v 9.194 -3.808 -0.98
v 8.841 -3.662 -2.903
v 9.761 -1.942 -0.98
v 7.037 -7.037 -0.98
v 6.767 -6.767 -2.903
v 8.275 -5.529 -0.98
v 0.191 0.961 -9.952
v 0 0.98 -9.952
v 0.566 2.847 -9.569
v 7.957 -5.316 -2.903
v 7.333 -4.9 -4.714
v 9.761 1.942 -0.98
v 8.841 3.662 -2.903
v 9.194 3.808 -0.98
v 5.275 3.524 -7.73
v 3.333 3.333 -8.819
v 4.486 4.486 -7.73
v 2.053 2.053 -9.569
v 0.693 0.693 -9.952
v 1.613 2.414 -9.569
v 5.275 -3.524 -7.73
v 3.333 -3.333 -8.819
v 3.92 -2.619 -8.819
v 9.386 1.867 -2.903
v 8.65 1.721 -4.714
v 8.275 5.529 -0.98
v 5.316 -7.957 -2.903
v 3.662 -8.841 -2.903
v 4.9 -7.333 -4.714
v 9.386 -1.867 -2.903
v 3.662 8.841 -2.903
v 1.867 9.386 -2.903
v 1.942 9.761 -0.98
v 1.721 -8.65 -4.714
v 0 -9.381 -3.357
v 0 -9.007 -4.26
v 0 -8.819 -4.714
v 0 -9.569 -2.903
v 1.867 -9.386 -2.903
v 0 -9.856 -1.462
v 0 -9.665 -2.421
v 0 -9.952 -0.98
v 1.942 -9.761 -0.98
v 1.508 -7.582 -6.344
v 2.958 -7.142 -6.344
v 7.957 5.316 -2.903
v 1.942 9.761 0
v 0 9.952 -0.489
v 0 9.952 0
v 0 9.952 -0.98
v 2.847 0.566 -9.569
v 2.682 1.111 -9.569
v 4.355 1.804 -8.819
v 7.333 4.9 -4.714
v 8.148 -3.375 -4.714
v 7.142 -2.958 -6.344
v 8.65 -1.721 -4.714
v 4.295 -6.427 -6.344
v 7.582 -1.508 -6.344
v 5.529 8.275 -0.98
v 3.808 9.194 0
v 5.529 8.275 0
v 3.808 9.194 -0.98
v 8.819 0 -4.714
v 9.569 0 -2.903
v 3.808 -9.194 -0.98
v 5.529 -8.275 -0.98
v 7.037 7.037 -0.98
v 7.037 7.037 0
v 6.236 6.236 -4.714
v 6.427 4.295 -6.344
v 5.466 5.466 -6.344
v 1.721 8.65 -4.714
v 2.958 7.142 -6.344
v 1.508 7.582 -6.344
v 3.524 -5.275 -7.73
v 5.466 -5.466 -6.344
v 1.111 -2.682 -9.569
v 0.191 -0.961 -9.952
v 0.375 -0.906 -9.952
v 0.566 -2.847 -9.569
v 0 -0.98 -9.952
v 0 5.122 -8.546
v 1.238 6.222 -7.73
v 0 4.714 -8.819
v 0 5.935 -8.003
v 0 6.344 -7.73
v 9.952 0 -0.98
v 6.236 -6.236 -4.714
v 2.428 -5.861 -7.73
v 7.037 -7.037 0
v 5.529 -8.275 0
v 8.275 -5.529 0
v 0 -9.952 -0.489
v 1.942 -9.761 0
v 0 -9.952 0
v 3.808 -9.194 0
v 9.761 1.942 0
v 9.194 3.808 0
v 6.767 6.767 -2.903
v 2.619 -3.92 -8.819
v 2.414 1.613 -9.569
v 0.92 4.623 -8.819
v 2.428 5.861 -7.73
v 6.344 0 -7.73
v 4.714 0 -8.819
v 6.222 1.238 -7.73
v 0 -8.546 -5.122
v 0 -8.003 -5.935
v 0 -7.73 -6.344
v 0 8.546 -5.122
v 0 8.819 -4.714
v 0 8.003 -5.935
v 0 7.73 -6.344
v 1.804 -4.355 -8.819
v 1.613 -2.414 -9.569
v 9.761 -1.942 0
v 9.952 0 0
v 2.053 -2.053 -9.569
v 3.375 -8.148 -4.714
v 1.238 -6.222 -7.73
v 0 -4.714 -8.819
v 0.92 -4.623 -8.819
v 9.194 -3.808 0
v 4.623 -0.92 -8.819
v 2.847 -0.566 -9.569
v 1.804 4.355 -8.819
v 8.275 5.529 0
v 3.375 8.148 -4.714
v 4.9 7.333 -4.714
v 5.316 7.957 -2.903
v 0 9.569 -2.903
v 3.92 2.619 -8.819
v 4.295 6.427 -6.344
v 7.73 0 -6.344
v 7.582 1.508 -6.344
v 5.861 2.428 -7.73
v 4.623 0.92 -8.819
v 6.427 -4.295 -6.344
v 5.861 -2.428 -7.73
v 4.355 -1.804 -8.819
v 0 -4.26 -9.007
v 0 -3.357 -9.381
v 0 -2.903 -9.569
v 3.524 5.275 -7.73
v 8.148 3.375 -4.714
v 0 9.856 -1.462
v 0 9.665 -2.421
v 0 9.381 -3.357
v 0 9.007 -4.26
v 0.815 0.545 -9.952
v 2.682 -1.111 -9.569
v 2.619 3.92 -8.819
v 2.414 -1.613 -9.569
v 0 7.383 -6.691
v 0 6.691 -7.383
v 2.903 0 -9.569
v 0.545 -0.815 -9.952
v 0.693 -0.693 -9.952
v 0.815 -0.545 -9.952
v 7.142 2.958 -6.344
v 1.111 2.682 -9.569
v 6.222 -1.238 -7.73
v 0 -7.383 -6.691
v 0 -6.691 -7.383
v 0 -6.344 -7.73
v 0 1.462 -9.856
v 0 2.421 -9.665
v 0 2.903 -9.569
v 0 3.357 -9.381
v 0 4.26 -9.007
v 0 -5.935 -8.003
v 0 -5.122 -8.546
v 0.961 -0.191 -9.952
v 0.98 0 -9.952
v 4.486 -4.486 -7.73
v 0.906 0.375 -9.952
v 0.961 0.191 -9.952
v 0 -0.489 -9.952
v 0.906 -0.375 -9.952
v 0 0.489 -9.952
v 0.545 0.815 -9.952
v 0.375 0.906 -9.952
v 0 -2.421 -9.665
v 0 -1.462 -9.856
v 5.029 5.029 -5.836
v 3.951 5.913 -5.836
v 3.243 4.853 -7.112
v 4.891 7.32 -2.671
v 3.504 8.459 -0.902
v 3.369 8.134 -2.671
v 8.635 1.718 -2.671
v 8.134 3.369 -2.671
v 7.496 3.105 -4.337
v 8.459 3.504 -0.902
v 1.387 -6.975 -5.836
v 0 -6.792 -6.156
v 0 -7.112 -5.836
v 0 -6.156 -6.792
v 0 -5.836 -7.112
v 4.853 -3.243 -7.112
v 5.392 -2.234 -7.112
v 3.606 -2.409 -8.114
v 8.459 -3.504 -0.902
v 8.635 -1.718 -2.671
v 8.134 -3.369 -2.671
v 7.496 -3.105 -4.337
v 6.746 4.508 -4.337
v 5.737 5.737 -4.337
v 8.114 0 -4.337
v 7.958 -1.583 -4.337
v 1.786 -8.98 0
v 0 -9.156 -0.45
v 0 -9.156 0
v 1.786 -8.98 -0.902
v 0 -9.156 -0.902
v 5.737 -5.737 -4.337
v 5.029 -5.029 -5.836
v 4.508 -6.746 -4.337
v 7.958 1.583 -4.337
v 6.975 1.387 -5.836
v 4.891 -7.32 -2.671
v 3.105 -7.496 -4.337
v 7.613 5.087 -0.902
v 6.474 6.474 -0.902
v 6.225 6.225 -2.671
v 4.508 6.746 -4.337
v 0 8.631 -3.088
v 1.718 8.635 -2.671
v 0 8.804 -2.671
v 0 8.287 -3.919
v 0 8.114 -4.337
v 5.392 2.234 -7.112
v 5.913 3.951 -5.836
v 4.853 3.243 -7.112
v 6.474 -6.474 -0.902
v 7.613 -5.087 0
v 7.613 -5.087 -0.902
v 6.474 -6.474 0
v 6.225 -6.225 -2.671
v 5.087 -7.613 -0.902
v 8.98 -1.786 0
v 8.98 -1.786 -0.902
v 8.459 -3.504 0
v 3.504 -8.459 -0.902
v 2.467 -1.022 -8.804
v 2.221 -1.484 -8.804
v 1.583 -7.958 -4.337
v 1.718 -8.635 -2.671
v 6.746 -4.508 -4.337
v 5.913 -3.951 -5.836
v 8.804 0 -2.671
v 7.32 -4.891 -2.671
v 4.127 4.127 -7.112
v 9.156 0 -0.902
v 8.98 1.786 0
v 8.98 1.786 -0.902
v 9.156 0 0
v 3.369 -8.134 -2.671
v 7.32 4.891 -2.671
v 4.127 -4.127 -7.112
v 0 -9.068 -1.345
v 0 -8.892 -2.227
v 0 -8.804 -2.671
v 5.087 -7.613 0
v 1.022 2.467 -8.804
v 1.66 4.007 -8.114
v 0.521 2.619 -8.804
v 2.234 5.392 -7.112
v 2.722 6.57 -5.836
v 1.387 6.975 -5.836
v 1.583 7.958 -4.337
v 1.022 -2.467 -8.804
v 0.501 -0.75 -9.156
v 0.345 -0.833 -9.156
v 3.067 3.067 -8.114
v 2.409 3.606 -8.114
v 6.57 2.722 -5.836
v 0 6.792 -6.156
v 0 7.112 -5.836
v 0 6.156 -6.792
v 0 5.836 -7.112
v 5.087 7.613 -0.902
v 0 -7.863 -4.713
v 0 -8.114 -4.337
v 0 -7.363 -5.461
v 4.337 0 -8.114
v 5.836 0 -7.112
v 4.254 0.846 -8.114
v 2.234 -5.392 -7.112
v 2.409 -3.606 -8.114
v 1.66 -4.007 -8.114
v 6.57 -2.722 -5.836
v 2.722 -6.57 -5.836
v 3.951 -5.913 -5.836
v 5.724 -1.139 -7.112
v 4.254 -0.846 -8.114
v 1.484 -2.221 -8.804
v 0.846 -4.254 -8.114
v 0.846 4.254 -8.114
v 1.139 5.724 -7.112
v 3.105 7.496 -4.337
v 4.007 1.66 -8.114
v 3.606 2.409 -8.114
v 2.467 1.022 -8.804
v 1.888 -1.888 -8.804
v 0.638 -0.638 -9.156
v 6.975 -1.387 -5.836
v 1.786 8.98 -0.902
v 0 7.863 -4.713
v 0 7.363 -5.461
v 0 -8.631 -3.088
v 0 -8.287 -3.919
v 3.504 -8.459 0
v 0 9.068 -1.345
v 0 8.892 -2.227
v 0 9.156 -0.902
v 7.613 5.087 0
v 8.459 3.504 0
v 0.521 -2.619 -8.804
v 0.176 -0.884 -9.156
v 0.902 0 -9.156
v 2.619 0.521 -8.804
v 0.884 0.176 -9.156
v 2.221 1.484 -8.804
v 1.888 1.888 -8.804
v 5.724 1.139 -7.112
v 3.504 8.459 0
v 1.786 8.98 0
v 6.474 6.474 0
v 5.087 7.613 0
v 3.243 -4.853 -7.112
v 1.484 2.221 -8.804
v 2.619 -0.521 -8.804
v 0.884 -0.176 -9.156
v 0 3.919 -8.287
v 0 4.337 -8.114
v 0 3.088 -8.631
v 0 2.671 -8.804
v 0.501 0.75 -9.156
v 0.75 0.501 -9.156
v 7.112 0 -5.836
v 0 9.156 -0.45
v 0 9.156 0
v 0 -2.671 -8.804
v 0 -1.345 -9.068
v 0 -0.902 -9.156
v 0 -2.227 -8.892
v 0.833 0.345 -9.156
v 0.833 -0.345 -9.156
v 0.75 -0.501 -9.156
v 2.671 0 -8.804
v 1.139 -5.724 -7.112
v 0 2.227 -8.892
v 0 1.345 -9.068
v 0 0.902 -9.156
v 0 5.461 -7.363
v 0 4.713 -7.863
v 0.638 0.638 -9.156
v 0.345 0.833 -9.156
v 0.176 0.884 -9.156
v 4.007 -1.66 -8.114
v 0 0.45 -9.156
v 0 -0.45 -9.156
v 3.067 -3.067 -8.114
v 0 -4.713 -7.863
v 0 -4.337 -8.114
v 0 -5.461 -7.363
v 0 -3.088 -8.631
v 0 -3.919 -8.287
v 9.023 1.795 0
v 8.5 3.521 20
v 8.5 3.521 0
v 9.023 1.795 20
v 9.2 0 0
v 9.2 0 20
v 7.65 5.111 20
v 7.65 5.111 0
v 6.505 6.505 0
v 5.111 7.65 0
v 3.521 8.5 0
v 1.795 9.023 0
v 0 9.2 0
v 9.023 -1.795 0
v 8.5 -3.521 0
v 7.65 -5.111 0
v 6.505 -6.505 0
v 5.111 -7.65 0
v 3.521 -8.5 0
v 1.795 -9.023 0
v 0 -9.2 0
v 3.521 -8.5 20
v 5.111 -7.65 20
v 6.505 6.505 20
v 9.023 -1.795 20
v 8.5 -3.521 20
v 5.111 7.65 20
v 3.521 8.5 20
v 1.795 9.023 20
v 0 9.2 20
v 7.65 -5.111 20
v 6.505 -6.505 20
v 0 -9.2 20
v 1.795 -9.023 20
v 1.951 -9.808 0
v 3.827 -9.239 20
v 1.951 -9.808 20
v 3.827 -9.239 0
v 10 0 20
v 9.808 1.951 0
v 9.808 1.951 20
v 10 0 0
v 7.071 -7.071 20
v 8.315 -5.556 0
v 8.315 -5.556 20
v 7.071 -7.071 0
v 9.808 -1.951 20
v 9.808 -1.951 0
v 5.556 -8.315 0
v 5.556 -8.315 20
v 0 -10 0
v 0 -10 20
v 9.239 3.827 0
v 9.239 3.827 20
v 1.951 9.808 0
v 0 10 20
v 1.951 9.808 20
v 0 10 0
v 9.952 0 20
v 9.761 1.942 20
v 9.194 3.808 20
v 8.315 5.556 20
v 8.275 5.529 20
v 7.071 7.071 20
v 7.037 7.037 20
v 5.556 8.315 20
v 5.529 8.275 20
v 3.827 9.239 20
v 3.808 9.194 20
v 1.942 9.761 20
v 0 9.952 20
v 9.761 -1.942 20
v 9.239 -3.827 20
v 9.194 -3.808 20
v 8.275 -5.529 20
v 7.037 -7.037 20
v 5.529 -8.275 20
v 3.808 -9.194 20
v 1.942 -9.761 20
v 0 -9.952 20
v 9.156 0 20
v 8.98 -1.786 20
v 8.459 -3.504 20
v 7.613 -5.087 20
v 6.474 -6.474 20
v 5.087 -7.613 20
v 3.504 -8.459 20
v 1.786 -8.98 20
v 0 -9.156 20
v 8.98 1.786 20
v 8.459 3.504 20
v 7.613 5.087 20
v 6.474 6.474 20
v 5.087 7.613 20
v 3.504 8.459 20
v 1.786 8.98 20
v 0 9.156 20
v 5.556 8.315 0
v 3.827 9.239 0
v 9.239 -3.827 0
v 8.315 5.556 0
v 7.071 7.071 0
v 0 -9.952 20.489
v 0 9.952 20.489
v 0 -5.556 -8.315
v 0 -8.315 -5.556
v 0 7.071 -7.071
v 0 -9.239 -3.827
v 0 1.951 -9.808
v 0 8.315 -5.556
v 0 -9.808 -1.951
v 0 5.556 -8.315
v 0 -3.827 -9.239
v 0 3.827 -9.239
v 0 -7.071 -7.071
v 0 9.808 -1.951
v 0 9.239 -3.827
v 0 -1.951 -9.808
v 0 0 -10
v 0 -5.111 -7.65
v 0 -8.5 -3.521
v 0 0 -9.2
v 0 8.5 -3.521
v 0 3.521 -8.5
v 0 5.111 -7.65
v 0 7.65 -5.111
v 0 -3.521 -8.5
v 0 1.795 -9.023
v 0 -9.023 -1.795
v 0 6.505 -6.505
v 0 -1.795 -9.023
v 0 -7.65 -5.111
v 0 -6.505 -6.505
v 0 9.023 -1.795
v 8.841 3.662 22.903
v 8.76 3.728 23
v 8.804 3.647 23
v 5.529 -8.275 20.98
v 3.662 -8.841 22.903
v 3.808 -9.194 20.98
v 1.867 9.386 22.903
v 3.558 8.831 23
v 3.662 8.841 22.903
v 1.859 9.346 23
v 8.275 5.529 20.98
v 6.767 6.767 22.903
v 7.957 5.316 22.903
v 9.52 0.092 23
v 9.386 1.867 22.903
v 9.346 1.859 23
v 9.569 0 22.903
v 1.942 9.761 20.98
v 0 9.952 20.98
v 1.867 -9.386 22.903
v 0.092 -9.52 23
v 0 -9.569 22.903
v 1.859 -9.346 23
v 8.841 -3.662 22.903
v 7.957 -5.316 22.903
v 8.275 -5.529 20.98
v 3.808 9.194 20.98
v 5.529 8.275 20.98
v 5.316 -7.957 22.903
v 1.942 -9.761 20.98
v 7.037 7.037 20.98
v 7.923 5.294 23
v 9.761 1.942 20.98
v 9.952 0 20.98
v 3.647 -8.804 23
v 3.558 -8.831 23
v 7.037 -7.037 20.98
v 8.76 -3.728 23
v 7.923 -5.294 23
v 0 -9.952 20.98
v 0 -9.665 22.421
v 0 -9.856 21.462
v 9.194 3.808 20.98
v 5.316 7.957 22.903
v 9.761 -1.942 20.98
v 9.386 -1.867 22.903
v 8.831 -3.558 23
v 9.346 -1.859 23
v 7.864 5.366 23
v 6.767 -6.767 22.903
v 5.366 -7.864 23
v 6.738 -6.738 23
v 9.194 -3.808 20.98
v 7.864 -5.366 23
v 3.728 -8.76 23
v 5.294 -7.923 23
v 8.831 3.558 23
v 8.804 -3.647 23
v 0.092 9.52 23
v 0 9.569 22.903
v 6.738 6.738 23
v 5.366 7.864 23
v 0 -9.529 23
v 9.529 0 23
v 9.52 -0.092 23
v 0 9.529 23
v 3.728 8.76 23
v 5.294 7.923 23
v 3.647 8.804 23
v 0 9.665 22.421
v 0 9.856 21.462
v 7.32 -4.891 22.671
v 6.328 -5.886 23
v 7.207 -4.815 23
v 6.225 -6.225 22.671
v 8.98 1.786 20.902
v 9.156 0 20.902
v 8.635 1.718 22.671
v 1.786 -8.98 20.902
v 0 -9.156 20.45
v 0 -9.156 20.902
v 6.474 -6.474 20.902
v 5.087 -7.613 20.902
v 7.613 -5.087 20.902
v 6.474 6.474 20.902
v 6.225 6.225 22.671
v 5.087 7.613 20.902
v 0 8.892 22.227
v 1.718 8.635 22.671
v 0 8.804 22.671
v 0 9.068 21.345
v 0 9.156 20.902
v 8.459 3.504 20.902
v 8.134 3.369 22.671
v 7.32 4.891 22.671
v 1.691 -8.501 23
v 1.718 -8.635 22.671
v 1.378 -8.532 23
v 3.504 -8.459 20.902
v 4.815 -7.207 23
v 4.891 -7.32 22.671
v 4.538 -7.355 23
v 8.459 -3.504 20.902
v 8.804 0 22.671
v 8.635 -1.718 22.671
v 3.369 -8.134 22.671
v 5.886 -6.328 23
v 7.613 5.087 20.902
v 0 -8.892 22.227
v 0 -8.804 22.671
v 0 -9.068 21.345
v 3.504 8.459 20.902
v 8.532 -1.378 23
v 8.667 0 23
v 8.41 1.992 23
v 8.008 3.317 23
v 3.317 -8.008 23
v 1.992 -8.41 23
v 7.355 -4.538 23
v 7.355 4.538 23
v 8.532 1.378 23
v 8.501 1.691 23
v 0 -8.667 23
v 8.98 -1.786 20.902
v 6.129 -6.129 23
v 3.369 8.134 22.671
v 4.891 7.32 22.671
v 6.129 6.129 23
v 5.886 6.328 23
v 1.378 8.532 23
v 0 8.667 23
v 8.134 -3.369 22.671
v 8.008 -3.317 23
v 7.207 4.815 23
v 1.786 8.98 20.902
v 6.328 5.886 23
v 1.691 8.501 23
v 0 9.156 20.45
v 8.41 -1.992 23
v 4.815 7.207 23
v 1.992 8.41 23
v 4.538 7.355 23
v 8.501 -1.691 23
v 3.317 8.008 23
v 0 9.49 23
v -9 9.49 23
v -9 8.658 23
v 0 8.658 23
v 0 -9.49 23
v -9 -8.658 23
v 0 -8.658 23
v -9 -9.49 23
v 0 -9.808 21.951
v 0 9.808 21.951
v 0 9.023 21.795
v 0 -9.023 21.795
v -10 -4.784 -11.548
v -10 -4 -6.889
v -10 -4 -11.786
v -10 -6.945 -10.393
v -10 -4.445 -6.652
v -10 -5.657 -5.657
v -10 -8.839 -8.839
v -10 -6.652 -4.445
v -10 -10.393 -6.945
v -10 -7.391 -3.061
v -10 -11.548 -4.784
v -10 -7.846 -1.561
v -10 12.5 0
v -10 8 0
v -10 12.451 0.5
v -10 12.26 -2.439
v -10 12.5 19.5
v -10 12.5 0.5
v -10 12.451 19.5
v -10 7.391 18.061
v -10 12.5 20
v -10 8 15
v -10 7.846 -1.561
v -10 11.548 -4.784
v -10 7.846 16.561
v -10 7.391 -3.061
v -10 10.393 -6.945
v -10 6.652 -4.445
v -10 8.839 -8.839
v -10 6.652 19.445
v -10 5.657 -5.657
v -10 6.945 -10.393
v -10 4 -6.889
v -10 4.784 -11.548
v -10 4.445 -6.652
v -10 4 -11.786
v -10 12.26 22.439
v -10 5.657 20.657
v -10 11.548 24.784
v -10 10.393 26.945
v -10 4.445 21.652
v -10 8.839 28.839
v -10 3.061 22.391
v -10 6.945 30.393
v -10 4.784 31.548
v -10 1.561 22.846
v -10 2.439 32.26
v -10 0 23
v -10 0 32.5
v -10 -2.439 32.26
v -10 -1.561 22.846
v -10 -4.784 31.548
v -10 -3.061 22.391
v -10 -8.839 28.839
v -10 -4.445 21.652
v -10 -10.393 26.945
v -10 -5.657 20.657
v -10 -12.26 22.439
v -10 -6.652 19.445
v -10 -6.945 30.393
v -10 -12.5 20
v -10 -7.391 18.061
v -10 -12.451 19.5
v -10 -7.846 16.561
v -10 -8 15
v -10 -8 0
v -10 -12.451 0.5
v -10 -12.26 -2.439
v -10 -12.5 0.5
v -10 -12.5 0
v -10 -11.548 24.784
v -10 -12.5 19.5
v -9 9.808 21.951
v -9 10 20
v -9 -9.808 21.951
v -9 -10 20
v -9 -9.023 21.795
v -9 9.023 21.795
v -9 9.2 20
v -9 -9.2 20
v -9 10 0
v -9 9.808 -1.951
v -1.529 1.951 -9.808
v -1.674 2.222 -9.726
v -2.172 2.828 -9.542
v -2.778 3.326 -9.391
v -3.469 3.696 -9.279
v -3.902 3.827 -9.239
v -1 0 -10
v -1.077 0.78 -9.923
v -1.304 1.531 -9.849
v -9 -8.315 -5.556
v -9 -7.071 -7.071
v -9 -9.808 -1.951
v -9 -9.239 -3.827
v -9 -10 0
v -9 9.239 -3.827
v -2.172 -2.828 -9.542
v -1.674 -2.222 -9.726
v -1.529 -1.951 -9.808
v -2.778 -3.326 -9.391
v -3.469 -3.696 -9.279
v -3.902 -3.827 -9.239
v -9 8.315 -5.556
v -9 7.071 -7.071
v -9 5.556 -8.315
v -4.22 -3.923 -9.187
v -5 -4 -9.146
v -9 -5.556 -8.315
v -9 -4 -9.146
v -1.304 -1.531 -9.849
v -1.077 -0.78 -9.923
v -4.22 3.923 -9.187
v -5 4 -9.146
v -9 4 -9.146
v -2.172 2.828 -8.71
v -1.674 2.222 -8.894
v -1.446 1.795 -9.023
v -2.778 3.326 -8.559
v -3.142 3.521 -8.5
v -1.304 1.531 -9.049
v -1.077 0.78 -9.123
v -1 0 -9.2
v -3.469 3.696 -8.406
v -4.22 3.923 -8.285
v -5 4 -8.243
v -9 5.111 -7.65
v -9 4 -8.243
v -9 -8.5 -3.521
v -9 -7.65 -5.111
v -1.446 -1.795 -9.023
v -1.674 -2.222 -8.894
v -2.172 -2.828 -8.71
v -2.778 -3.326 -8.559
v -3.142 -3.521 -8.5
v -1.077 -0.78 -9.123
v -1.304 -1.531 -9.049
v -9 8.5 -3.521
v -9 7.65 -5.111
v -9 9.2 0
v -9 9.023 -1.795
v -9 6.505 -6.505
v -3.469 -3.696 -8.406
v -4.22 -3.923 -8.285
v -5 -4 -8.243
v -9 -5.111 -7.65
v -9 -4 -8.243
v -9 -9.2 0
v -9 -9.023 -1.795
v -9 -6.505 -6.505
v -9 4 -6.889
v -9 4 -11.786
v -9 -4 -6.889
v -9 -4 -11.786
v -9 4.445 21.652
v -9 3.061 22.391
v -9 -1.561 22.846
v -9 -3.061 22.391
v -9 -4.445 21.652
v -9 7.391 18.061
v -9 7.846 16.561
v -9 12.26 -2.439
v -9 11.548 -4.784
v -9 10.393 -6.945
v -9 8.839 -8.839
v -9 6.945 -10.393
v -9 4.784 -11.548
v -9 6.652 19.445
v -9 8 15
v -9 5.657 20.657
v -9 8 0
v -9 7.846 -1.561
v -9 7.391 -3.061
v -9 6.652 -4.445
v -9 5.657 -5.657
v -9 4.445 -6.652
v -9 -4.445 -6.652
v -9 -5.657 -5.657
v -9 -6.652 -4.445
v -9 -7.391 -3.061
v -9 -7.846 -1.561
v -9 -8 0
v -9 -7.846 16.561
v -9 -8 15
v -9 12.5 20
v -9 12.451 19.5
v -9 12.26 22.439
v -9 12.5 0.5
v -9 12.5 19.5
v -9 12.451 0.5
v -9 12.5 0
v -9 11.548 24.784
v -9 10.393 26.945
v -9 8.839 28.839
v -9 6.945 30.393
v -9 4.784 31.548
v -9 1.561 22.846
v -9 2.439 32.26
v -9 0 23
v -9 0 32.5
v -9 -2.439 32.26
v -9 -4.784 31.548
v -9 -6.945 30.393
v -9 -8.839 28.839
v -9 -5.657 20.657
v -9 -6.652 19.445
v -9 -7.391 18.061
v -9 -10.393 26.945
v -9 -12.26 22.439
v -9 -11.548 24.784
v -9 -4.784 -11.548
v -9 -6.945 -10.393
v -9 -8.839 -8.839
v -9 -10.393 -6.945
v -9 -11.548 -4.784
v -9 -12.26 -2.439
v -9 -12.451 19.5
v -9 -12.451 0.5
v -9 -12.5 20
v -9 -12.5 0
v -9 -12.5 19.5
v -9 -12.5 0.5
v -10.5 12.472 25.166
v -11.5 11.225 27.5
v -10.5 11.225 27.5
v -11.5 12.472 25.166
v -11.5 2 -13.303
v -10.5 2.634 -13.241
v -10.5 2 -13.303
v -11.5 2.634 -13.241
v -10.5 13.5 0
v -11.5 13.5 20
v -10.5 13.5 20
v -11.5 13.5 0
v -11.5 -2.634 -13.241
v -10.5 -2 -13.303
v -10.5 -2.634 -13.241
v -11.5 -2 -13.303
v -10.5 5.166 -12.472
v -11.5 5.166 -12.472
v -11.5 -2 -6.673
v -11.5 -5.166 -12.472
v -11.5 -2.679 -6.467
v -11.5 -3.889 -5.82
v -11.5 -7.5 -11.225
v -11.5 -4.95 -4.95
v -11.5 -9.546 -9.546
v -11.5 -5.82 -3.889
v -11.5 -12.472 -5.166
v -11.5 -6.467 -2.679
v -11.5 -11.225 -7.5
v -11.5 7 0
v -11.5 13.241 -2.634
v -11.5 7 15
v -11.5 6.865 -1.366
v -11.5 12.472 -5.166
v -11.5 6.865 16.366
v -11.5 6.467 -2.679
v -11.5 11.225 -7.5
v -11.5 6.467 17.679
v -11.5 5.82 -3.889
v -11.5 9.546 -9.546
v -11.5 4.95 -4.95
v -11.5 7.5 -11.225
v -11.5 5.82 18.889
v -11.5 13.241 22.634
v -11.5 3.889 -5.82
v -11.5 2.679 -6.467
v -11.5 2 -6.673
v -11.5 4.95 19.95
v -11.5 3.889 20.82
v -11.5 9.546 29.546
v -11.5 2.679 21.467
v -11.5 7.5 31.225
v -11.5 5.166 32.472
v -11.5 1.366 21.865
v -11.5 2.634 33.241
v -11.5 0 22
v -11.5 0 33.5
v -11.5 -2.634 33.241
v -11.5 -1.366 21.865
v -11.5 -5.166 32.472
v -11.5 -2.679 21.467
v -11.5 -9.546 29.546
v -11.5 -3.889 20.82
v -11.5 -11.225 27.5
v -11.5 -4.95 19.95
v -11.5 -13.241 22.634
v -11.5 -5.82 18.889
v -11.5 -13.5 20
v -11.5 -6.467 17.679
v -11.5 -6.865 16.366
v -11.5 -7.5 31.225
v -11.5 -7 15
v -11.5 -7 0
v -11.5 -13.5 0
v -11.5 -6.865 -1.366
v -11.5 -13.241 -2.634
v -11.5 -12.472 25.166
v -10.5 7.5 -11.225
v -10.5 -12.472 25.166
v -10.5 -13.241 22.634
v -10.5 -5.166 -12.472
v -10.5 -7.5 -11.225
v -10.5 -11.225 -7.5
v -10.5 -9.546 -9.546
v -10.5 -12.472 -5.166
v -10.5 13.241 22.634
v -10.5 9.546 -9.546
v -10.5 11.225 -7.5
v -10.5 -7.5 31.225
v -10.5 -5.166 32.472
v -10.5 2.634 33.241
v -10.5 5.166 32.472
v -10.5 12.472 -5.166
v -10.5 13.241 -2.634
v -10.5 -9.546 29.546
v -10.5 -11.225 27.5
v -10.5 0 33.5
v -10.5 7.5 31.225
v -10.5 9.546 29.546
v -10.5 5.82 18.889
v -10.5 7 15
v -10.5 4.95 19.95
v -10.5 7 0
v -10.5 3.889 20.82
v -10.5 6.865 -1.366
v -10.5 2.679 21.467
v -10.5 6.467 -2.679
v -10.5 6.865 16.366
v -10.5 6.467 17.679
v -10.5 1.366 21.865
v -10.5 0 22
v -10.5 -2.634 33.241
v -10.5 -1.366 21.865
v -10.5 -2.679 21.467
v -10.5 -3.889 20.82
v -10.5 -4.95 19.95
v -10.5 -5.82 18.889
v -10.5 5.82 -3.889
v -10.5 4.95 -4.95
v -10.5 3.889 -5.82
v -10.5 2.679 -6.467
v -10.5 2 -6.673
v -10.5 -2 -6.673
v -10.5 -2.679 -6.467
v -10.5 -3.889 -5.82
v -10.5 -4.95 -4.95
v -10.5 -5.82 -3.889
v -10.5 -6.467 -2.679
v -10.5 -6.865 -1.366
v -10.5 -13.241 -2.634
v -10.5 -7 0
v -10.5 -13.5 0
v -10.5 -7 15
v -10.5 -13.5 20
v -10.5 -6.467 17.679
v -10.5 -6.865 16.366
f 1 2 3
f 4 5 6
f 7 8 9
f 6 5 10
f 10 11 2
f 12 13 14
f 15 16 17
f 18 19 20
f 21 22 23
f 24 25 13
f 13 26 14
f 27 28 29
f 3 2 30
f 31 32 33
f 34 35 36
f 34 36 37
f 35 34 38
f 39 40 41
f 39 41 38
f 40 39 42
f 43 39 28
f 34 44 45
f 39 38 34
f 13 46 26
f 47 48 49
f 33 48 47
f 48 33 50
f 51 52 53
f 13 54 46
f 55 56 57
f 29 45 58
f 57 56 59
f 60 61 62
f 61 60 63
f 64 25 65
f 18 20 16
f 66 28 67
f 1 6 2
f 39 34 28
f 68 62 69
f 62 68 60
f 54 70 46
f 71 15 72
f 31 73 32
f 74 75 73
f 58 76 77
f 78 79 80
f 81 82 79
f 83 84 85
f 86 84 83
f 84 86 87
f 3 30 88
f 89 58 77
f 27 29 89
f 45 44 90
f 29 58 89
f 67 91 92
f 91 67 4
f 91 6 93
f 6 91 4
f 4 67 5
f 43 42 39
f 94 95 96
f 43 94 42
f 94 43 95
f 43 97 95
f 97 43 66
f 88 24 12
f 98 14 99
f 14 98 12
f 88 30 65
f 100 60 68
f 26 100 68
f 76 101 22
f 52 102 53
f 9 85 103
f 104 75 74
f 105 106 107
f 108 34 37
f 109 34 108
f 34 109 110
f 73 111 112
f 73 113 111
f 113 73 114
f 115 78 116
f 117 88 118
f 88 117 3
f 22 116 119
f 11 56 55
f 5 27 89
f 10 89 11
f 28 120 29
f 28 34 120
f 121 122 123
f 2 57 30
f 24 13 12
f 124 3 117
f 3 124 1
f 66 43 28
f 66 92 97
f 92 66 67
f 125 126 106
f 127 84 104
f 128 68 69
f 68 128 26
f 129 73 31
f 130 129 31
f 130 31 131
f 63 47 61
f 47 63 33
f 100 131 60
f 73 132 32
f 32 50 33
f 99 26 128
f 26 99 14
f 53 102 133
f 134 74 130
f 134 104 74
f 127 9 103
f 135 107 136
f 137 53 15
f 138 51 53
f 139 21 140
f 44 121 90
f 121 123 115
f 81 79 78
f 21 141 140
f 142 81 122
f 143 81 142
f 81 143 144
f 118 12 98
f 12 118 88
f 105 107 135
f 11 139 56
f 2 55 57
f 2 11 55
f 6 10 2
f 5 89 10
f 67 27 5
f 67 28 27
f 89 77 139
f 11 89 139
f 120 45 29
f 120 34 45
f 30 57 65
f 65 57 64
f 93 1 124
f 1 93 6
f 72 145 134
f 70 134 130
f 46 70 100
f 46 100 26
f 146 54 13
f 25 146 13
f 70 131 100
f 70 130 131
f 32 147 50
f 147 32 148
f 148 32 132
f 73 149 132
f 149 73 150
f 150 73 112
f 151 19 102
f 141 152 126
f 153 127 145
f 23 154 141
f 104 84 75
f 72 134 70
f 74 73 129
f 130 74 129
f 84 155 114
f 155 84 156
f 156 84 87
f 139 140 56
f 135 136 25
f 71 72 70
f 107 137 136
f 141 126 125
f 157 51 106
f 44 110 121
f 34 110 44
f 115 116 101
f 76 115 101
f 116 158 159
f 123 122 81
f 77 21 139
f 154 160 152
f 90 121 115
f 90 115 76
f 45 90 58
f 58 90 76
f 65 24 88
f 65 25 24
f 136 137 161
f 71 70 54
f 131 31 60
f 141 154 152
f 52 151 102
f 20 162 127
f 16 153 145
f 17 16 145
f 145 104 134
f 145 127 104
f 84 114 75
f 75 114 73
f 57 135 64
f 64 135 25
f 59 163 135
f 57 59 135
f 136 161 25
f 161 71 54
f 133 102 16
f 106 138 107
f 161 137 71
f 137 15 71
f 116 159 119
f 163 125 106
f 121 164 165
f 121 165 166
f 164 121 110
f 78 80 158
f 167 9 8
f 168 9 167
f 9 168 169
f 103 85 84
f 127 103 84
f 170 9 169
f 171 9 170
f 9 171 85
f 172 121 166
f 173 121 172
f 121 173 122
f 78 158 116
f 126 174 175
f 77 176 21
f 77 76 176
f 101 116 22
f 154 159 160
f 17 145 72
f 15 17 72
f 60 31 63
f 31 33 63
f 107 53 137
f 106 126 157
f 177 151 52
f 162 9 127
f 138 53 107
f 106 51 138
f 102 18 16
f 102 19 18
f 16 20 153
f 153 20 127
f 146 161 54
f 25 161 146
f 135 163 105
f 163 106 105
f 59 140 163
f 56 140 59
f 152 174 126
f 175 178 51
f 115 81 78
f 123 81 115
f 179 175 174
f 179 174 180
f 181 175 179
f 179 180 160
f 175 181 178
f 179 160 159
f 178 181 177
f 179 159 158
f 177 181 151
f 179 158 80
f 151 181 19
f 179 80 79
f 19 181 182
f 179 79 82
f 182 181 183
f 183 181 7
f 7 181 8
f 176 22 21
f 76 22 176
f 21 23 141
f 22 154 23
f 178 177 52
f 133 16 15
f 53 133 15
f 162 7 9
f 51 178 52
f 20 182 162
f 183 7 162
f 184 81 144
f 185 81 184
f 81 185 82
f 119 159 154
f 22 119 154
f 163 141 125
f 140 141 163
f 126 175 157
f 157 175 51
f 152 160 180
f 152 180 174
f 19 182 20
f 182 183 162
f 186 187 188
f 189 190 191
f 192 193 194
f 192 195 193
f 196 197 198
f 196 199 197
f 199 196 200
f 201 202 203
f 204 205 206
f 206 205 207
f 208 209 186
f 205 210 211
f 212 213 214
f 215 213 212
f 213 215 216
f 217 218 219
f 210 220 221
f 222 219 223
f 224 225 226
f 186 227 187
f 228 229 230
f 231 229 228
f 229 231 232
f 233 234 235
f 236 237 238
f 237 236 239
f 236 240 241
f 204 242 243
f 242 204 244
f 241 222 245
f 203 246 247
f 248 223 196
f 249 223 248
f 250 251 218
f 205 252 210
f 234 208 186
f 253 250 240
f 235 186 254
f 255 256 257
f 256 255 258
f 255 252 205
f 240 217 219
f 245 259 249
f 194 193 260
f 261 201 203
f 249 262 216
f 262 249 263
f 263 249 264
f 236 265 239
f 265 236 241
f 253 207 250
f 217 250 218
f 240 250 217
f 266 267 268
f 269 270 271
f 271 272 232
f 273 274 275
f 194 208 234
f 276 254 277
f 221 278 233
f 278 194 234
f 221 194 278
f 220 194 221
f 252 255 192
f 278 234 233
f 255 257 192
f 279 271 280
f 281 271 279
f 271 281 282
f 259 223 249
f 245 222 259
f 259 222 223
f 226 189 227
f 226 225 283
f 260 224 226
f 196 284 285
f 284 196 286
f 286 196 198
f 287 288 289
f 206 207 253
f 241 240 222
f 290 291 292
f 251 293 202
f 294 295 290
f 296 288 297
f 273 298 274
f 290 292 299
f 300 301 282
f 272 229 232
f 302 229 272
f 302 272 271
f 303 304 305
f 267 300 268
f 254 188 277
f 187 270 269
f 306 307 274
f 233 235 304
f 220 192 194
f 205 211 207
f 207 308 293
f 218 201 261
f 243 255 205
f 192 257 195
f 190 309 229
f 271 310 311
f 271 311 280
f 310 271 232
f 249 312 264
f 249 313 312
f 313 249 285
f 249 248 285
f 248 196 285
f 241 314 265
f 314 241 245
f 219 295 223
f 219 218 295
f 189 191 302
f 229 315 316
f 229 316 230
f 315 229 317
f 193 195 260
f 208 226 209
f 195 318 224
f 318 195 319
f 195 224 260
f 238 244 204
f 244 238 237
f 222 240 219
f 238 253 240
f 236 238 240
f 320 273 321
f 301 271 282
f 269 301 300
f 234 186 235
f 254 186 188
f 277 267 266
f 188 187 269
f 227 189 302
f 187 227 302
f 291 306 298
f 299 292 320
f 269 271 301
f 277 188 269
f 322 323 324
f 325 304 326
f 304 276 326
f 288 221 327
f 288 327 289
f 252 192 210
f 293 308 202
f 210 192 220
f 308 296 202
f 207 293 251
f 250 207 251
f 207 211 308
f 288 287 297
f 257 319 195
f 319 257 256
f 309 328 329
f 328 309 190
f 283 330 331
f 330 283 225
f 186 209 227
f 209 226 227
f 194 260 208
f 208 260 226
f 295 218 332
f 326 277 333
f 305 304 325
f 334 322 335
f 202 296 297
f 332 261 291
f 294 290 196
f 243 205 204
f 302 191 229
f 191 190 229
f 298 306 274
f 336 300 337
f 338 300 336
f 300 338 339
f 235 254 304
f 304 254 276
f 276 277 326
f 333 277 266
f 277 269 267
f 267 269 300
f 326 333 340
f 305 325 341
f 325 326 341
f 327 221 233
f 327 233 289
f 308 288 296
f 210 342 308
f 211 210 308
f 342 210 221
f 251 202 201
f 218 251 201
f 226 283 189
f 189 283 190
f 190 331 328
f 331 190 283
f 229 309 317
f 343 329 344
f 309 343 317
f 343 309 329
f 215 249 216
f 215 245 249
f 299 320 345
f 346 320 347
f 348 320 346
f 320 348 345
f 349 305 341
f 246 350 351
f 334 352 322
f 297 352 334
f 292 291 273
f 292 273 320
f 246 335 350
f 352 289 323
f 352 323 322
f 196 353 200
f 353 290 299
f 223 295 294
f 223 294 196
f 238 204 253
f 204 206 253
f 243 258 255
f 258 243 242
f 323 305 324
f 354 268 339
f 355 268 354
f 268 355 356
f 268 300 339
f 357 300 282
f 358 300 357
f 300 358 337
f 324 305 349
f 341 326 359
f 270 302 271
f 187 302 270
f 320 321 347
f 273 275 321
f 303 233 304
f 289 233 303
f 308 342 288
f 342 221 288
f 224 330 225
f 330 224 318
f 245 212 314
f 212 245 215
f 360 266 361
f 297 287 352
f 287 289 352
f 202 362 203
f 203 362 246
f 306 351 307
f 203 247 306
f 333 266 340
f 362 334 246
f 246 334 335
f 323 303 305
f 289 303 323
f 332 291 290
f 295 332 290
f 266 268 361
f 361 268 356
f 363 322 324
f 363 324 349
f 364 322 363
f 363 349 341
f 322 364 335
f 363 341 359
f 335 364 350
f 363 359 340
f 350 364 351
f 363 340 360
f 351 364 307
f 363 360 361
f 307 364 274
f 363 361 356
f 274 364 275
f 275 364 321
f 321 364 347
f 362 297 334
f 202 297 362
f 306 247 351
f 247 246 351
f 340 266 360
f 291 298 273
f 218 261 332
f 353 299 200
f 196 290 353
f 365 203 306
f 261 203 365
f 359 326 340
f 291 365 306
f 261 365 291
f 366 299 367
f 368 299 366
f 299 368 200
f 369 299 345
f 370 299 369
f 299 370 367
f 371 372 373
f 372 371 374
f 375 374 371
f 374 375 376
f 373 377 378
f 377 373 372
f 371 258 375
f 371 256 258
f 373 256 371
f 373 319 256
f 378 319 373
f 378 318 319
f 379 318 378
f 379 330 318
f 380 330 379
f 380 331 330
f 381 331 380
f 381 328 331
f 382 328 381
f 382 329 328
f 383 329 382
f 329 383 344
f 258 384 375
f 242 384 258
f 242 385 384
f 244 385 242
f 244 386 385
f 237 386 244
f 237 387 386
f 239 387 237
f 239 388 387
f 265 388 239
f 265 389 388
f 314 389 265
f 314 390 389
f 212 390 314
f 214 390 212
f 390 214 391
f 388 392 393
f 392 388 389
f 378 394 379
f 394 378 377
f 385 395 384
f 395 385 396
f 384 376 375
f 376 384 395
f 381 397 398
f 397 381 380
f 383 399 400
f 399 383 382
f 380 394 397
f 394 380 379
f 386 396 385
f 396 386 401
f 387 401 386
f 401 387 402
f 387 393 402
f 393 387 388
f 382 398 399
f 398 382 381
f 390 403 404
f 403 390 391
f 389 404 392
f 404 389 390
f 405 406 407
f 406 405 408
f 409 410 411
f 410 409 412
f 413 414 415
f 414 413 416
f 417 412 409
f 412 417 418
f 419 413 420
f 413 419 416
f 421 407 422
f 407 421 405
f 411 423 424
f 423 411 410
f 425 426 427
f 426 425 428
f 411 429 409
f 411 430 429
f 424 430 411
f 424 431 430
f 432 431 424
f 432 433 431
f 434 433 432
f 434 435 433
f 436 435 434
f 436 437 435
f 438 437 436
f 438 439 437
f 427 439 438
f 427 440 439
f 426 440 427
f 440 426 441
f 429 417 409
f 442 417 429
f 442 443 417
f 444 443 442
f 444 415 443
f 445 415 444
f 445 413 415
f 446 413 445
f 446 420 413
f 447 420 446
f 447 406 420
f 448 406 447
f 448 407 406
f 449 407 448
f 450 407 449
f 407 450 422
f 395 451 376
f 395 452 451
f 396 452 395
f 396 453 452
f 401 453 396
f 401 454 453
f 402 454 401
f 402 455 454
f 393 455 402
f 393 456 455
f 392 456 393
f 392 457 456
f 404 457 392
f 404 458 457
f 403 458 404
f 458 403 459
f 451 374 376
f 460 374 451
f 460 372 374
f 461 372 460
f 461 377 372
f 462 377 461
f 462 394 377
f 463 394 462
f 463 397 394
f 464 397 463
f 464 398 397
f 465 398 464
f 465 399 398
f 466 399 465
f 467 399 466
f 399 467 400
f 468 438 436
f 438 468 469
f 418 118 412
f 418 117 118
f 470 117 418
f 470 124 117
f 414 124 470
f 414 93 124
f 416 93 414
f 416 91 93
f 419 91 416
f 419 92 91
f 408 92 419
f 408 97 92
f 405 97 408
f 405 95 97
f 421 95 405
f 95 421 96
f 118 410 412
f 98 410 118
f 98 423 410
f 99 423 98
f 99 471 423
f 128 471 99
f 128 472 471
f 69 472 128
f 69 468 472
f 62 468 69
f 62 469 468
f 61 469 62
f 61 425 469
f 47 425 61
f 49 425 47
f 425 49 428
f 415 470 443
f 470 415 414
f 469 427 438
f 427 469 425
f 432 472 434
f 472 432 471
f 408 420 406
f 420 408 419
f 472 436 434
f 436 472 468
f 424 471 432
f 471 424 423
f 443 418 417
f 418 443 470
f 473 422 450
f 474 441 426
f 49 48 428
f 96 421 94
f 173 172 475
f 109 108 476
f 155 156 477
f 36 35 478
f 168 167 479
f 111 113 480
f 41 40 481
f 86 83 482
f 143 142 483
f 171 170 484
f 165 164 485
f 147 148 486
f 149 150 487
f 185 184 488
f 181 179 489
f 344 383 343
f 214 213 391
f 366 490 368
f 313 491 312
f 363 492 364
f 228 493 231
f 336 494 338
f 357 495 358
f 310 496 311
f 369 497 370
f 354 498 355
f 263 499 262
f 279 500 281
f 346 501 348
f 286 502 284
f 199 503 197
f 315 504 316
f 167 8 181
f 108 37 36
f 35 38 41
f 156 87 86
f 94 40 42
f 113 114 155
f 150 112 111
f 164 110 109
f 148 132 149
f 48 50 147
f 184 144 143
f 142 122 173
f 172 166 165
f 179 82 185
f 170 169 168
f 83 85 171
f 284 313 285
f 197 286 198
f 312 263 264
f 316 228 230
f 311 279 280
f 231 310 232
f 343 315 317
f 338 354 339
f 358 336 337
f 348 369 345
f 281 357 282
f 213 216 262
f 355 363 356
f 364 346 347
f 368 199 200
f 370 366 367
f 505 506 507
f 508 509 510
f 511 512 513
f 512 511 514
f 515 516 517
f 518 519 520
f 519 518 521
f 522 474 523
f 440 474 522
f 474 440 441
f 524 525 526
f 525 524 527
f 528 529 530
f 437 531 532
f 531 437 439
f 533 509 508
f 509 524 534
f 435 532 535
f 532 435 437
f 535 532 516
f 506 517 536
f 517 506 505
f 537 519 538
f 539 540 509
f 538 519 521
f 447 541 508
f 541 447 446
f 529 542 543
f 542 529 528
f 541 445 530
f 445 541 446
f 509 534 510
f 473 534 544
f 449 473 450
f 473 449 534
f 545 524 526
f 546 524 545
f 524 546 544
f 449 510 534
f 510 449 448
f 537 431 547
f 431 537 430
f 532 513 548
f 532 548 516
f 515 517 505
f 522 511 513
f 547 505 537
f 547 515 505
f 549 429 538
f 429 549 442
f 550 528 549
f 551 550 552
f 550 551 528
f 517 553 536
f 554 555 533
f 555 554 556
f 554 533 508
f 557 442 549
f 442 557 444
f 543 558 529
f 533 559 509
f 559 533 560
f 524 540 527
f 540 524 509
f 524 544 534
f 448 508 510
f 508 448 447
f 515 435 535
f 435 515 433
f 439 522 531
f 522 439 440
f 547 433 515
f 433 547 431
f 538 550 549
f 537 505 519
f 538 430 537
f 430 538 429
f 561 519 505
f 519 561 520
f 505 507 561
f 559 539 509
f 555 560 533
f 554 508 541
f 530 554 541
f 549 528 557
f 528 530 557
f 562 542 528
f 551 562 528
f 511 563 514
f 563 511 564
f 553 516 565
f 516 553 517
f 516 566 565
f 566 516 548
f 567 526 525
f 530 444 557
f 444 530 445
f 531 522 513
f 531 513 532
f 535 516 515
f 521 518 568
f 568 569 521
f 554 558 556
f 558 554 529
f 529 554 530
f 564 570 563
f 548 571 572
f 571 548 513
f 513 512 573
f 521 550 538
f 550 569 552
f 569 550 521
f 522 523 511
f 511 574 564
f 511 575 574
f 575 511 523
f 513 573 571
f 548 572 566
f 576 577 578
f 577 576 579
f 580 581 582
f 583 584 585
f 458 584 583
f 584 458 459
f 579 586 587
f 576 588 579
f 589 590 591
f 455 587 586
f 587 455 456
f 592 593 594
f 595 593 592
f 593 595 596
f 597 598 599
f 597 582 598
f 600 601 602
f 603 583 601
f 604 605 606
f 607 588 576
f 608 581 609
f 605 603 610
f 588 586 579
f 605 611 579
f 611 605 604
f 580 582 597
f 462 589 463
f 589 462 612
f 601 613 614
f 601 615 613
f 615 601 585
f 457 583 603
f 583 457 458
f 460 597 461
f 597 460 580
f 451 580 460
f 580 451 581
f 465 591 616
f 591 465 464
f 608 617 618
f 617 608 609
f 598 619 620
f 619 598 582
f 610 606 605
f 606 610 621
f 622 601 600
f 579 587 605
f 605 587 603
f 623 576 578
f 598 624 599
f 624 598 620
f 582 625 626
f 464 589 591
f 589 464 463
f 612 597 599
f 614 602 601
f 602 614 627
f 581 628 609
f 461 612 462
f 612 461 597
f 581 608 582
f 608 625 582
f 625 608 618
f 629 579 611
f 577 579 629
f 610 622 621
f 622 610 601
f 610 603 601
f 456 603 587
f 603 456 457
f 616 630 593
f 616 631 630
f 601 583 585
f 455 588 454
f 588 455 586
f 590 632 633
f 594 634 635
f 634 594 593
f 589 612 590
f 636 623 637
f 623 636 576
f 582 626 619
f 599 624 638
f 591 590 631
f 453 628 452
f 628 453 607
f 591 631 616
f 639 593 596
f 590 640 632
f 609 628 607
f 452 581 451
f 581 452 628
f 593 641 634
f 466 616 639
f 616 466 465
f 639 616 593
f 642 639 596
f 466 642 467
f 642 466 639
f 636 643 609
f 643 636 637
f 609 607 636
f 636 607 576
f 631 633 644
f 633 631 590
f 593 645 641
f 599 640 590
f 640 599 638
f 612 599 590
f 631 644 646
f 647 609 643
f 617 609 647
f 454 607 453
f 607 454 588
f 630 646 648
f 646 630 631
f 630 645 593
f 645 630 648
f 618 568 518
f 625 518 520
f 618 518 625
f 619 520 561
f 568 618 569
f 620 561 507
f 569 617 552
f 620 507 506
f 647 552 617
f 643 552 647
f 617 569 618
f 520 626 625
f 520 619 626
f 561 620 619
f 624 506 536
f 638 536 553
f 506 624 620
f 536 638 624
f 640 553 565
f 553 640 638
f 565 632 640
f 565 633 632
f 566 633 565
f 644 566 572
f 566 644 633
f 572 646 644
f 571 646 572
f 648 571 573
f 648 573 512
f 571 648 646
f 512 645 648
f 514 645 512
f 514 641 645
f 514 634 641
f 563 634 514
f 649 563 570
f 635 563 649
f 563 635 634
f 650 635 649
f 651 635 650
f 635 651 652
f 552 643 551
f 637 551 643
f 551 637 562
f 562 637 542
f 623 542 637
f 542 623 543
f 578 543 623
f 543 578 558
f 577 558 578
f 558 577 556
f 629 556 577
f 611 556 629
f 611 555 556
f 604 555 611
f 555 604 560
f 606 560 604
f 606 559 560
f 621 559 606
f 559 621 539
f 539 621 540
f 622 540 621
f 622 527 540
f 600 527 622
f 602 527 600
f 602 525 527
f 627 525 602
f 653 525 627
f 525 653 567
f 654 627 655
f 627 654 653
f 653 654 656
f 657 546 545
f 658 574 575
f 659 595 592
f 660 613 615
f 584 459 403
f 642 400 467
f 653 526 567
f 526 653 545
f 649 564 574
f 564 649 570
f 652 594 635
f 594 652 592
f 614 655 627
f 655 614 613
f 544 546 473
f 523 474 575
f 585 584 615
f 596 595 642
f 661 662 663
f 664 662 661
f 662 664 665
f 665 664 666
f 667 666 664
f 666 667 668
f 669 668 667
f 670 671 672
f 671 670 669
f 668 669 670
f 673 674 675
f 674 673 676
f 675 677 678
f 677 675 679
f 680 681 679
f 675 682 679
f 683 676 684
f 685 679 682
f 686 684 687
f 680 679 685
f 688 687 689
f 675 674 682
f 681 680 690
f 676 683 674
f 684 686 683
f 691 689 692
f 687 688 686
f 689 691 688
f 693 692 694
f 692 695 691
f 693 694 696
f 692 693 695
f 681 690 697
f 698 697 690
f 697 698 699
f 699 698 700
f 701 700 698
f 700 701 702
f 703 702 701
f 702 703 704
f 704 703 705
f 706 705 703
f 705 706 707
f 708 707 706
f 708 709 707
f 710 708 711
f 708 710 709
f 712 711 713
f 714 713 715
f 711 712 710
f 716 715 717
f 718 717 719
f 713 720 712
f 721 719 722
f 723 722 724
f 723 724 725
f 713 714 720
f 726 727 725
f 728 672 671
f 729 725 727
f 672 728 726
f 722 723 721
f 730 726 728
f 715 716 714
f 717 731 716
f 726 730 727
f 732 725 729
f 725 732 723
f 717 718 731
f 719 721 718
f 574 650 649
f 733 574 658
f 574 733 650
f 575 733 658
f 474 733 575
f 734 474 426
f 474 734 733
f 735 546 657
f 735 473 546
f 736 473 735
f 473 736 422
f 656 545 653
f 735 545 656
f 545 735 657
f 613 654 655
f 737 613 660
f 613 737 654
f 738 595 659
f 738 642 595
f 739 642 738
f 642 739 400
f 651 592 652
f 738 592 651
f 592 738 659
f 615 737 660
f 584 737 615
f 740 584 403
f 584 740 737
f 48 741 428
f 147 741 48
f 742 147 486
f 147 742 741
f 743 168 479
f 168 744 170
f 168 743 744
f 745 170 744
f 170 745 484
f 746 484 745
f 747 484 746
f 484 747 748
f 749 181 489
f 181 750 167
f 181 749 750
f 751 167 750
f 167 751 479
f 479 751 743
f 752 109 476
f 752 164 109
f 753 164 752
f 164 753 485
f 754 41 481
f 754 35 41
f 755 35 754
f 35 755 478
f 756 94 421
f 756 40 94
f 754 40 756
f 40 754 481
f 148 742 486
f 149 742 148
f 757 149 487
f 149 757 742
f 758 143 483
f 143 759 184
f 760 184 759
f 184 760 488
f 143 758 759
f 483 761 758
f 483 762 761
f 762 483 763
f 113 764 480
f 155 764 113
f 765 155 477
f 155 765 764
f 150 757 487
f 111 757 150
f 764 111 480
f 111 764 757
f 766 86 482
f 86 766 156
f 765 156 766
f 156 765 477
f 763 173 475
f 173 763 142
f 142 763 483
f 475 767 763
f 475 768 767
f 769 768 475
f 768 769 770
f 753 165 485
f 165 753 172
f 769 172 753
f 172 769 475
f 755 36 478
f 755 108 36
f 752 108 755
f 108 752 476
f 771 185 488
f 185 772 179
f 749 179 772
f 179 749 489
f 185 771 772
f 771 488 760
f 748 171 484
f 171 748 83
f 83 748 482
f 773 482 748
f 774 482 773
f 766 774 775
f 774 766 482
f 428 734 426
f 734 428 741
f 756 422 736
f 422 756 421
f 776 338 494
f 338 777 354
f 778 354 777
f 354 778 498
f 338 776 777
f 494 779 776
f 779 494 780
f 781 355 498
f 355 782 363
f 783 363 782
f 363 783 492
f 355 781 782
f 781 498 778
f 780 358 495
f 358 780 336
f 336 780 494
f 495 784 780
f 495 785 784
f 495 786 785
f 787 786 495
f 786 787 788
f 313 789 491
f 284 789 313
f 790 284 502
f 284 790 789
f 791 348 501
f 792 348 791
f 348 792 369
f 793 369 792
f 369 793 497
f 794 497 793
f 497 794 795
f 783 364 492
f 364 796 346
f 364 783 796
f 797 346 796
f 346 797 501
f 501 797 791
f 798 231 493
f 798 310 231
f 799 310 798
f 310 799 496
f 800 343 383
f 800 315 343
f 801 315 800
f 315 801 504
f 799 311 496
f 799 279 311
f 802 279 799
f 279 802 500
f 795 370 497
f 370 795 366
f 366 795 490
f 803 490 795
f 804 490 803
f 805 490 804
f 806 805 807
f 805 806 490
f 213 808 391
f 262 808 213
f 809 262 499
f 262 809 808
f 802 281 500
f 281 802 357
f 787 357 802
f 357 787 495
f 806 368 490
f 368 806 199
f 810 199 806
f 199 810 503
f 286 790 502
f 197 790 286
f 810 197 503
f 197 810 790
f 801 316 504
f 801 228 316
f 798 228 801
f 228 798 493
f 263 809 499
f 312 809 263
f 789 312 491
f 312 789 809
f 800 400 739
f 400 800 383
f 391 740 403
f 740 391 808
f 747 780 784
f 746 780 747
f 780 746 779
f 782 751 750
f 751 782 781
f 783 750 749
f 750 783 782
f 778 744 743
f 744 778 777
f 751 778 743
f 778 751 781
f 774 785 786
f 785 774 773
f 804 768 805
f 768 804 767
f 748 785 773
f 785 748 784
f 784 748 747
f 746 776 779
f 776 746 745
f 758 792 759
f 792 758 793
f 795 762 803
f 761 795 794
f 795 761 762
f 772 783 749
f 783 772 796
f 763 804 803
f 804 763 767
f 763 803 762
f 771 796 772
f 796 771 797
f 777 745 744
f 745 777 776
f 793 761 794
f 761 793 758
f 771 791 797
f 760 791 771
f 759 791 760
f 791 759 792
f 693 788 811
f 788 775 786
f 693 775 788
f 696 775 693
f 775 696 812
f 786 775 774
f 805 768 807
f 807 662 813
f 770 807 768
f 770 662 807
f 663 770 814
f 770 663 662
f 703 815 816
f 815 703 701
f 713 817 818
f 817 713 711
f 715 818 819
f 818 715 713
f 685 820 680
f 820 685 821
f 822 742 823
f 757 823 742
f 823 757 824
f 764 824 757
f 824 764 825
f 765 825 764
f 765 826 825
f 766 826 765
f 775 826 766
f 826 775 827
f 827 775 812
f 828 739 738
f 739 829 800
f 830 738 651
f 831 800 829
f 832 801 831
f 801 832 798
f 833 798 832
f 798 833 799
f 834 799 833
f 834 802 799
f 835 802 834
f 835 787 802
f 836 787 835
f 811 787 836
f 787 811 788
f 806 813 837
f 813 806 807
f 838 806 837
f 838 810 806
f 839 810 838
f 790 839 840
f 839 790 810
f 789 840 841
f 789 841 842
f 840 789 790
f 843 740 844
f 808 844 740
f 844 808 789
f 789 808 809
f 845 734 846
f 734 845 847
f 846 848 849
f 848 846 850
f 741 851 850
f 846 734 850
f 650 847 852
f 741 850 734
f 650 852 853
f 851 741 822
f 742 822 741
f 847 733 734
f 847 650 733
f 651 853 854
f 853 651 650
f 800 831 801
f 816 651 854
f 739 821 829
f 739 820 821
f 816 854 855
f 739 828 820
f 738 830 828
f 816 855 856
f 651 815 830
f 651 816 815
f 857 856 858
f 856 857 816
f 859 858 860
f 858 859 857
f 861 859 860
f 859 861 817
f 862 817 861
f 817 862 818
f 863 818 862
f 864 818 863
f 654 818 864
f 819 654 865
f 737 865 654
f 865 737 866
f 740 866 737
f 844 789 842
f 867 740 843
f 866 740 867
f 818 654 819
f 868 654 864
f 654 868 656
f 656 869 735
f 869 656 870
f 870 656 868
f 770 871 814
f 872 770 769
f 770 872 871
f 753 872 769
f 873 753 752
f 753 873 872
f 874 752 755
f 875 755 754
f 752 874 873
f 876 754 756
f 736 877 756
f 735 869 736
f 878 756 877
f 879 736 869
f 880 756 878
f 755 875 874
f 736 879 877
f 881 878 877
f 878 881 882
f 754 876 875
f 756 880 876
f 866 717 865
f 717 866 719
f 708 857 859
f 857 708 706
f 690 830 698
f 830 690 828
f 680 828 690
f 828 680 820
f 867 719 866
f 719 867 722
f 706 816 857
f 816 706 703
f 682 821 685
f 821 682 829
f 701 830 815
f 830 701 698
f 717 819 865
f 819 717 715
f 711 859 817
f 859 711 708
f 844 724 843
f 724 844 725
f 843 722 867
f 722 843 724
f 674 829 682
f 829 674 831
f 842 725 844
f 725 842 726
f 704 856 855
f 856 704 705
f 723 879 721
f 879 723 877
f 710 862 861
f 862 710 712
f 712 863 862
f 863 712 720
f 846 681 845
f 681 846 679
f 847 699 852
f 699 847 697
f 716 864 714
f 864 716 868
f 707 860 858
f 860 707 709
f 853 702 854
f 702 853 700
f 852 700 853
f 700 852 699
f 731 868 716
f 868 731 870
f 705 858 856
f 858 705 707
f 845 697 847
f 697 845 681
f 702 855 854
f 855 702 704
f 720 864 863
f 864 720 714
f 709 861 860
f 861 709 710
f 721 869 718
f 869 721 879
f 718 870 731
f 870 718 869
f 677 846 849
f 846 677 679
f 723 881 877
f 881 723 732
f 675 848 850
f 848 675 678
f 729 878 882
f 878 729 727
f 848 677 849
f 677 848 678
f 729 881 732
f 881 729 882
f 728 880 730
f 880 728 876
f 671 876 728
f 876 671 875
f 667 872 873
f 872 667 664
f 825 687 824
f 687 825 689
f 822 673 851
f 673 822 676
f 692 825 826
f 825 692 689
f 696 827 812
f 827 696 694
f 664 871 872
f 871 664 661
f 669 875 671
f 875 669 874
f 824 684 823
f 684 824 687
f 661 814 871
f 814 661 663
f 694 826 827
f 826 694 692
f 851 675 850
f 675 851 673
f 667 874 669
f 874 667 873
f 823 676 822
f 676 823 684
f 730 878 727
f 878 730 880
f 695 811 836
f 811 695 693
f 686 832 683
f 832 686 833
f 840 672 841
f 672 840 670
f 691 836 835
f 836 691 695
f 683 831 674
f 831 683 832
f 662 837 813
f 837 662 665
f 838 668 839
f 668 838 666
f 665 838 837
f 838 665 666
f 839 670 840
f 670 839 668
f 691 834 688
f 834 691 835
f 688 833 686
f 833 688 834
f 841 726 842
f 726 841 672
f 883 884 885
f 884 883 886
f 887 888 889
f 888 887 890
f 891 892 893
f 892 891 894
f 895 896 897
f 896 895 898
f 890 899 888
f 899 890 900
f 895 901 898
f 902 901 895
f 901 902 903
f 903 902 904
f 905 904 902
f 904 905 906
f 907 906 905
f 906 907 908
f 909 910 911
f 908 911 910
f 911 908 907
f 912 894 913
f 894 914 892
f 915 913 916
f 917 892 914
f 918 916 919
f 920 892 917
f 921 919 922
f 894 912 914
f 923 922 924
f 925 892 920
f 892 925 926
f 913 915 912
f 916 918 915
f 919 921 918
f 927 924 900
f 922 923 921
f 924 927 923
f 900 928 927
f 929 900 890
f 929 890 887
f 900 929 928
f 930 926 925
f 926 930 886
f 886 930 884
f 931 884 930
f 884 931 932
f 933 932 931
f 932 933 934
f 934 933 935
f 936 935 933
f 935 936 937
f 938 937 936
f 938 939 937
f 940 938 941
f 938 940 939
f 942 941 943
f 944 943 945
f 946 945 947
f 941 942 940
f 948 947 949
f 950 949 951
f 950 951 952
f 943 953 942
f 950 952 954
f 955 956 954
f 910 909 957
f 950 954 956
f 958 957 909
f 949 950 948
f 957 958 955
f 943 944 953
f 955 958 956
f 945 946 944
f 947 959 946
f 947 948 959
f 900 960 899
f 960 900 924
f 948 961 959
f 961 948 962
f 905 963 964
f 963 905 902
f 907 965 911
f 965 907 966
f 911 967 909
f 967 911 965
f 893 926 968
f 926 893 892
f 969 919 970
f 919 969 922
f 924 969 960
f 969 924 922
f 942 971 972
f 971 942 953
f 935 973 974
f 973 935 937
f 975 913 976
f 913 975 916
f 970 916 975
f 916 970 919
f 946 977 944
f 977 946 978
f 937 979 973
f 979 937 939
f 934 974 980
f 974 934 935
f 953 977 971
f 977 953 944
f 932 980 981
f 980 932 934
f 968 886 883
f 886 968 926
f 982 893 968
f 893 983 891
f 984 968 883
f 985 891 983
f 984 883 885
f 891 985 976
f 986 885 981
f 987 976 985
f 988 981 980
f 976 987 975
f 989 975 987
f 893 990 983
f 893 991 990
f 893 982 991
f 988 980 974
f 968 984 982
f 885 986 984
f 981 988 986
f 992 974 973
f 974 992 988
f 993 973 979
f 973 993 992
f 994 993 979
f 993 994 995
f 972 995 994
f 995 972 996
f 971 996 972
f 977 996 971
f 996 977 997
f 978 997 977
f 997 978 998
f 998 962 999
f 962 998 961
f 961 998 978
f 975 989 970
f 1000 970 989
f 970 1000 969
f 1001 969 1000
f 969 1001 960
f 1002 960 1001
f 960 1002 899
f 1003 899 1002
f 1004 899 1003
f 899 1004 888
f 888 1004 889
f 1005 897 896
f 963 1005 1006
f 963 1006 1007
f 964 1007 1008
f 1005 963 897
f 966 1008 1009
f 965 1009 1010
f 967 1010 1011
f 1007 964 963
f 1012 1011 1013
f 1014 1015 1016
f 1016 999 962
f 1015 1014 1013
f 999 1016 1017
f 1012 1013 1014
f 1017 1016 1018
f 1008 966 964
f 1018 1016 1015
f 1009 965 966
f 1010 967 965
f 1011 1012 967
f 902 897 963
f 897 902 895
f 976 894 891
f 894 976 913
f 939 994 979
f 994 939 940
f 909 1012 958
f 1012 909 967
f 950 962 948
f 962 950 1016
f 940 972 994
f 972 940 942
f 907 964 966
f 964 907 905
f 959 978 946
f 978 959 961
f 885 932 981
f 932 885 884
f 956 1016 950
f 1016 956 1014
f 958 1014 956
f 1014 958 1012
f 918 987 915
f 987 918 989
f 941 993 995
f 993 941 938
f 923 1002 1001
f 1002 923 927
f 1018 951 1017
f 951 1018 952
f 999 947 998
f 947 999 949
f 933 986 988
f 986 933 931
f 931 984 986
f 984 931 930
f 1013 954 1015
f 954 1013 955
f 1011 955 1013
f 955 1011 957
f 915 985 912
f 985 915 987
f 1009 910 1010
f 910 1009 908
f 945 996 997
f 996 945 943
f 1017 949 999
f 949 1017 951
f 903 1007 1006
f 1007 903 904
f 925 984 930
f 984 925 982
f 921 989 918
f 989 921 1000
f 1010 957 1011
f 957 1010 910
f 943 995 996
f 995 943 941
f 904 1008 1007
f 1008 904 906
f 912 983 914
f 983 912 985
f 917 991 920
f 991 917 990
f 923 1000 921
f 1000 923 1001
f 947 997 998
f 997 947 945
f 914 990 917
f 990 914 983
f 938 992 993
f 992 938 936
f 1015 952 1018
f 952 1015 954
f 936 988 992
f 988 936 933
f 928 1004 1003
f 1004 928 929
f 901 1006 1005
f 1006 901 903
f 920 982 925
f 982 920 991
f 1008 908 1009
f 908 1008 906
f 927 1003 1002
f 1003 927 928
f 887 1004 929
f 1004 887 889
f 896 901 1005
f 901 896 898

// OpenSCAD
$fn = 32;

module cover(){    
    dome();
    backridge();
    base();
    fin();
    rim();  
    foam();
}

module backridge(){
     translate([0,0, 20]){
        difference(){
            union(){
                difference(){
                    sphere(10, center=true);
                    sphere(9.2, center=true);
                
                }
            }
            translate([0,0,-10]){
                cylinder(10,10,10);
            } 
            translate([0,0,3]){
                cylinder(10,10,10);
            }          
            translate([-10,0,2]){
                cube([20,20,10], center=true);
            }       
        }
        difference(){
            rotate([0,90]){
                translate([0,0,-10]){
                    difference(){
                        cylinder(10,10,10);
                        cylinder(20,9.2,9.2);
                    } 
                }
            }
            translate([0,0,8]){
                cube([20,20,10], center=true);
            }   
            translate([0,0,-5]){
                cube([20,20,10], center=true);
            }         
        }
    }     
    
}

module base(){
   	translate([-10, 0, 0]){
        difference(){
            rotate([0,90]){
                difference(){
                    difference(){
                        union(){
                            cylinder(d=20, h=10);
                            translate([-10,0,5]){
                                cube([20,20,10], center=true);
                            }
                        }

                        union(){
                            cylinder(d=18.4, h=10);
                            translate([-10,0,5]){
                                cube([20,18.4,10], center=true);
                            }
                        }
                    }
                    translate([10,0,5]){
                        rotate([0, -90]){
                            cylinder(d=8, h=3);
                            translate([-4,0,0]){
                                cube([8,8,8], center=true);
                            }
                        }
                    }             
                }
            }
        }
	} 
}

module dome(){
 	difference(){
		union(){
			difference(){
				sphere(10, center=true);
				sphere(9.2, center=true);
				cylinder(25,9.2,9.2);
			}
			difference(){
				cylinder(20,10,10);
				cylinder(25,9.2,9.2);
			}
		}

		translate([-10, 0, 0]){
			cube([20,20,50], center=true);
		}
	}     
}

module fin(){
	/* Small finn behind */
	translate([-9.5,0,20]){
		rotate([0,90,0]){
			difference(){
				cylinder(d=25, h=1, center=true);
				translate([5,0,0]){
					cylinder(d=16, h=1, center=true);
                    translate([5,0,0]){
                        cube([10,16,2], center=true);
                    }
				}
                
			}
            
		}
	}     
}

module rim(){  
	translate([-9.5,0,10]){
		difference(){
			union(){
				cube([1,25,19], center=true);
				translate([0,0,-10]){
					rotate([0,90,0]){
						cylinder(d=25, h=1, center=true);
					}
				}
			}
			union(){
				cube([2,16,20], center=true);
				translate([0,0,-10]){
					rotate([0,90,0]){
						cylinder(d=16, h=2, center=true);
					}
				}
				translate([0,0,-15]){
					cube([2, 8, 20], center = true);
				}
			}

		}
	}   
}

module iv(){
	translate([0, 43, 4]){
		cylinder(d=10, h=10);
	}

	translate([0, 38, -4]){
		cube(size = [30, 10, 2], center=true);
	}

	rotate([-90]){
		cylinder(h=25, d=1);
		translate([0,0,25]){
			cylinder(h=29, d1=4, d2=6);
			translate([0,0,29]){
				cylinder(h=10, d=10);
				translate([0,0,10]){
					cylinder(h=12, d=4);
				}
			}
		}
	} 
}


module foam(){
        difference(){
        /* Pos Oval*/
        translate([-11,0,0]){
            hull(){
                translate([0,0,20]){
                    rotate([0,90,0]){
                        cylinder(d=27, h=1, center=true);
                    }
                }
                rotate([0,90,0]){
                    cylinder(d=27, h=1, center=true);
                }
            }
        }
        
        /* Neg Oval*/
        translate([-11,0,0]){
            hull(){
                translate([0,0,15]){
                    rotate([0,90,0]){
                        cylinder(d=14, h=2, center=true);
                    }
                }
                rotate([0,90,0]){
                    cylinder(d=14, h=2, center=true);
                }
            }
        }
        
        /* Neg Slot */
        translate([-10,0,-5]){
            cube([8,4,18], center=true);
        }    
    }      
}



translate([-6, 0, -40]){
	rotate([100,0,90]){
		 //color([0,1,0]) iv();
	}
}


translate([0,0,0]){
	color([0,0,1]) cover();
}
